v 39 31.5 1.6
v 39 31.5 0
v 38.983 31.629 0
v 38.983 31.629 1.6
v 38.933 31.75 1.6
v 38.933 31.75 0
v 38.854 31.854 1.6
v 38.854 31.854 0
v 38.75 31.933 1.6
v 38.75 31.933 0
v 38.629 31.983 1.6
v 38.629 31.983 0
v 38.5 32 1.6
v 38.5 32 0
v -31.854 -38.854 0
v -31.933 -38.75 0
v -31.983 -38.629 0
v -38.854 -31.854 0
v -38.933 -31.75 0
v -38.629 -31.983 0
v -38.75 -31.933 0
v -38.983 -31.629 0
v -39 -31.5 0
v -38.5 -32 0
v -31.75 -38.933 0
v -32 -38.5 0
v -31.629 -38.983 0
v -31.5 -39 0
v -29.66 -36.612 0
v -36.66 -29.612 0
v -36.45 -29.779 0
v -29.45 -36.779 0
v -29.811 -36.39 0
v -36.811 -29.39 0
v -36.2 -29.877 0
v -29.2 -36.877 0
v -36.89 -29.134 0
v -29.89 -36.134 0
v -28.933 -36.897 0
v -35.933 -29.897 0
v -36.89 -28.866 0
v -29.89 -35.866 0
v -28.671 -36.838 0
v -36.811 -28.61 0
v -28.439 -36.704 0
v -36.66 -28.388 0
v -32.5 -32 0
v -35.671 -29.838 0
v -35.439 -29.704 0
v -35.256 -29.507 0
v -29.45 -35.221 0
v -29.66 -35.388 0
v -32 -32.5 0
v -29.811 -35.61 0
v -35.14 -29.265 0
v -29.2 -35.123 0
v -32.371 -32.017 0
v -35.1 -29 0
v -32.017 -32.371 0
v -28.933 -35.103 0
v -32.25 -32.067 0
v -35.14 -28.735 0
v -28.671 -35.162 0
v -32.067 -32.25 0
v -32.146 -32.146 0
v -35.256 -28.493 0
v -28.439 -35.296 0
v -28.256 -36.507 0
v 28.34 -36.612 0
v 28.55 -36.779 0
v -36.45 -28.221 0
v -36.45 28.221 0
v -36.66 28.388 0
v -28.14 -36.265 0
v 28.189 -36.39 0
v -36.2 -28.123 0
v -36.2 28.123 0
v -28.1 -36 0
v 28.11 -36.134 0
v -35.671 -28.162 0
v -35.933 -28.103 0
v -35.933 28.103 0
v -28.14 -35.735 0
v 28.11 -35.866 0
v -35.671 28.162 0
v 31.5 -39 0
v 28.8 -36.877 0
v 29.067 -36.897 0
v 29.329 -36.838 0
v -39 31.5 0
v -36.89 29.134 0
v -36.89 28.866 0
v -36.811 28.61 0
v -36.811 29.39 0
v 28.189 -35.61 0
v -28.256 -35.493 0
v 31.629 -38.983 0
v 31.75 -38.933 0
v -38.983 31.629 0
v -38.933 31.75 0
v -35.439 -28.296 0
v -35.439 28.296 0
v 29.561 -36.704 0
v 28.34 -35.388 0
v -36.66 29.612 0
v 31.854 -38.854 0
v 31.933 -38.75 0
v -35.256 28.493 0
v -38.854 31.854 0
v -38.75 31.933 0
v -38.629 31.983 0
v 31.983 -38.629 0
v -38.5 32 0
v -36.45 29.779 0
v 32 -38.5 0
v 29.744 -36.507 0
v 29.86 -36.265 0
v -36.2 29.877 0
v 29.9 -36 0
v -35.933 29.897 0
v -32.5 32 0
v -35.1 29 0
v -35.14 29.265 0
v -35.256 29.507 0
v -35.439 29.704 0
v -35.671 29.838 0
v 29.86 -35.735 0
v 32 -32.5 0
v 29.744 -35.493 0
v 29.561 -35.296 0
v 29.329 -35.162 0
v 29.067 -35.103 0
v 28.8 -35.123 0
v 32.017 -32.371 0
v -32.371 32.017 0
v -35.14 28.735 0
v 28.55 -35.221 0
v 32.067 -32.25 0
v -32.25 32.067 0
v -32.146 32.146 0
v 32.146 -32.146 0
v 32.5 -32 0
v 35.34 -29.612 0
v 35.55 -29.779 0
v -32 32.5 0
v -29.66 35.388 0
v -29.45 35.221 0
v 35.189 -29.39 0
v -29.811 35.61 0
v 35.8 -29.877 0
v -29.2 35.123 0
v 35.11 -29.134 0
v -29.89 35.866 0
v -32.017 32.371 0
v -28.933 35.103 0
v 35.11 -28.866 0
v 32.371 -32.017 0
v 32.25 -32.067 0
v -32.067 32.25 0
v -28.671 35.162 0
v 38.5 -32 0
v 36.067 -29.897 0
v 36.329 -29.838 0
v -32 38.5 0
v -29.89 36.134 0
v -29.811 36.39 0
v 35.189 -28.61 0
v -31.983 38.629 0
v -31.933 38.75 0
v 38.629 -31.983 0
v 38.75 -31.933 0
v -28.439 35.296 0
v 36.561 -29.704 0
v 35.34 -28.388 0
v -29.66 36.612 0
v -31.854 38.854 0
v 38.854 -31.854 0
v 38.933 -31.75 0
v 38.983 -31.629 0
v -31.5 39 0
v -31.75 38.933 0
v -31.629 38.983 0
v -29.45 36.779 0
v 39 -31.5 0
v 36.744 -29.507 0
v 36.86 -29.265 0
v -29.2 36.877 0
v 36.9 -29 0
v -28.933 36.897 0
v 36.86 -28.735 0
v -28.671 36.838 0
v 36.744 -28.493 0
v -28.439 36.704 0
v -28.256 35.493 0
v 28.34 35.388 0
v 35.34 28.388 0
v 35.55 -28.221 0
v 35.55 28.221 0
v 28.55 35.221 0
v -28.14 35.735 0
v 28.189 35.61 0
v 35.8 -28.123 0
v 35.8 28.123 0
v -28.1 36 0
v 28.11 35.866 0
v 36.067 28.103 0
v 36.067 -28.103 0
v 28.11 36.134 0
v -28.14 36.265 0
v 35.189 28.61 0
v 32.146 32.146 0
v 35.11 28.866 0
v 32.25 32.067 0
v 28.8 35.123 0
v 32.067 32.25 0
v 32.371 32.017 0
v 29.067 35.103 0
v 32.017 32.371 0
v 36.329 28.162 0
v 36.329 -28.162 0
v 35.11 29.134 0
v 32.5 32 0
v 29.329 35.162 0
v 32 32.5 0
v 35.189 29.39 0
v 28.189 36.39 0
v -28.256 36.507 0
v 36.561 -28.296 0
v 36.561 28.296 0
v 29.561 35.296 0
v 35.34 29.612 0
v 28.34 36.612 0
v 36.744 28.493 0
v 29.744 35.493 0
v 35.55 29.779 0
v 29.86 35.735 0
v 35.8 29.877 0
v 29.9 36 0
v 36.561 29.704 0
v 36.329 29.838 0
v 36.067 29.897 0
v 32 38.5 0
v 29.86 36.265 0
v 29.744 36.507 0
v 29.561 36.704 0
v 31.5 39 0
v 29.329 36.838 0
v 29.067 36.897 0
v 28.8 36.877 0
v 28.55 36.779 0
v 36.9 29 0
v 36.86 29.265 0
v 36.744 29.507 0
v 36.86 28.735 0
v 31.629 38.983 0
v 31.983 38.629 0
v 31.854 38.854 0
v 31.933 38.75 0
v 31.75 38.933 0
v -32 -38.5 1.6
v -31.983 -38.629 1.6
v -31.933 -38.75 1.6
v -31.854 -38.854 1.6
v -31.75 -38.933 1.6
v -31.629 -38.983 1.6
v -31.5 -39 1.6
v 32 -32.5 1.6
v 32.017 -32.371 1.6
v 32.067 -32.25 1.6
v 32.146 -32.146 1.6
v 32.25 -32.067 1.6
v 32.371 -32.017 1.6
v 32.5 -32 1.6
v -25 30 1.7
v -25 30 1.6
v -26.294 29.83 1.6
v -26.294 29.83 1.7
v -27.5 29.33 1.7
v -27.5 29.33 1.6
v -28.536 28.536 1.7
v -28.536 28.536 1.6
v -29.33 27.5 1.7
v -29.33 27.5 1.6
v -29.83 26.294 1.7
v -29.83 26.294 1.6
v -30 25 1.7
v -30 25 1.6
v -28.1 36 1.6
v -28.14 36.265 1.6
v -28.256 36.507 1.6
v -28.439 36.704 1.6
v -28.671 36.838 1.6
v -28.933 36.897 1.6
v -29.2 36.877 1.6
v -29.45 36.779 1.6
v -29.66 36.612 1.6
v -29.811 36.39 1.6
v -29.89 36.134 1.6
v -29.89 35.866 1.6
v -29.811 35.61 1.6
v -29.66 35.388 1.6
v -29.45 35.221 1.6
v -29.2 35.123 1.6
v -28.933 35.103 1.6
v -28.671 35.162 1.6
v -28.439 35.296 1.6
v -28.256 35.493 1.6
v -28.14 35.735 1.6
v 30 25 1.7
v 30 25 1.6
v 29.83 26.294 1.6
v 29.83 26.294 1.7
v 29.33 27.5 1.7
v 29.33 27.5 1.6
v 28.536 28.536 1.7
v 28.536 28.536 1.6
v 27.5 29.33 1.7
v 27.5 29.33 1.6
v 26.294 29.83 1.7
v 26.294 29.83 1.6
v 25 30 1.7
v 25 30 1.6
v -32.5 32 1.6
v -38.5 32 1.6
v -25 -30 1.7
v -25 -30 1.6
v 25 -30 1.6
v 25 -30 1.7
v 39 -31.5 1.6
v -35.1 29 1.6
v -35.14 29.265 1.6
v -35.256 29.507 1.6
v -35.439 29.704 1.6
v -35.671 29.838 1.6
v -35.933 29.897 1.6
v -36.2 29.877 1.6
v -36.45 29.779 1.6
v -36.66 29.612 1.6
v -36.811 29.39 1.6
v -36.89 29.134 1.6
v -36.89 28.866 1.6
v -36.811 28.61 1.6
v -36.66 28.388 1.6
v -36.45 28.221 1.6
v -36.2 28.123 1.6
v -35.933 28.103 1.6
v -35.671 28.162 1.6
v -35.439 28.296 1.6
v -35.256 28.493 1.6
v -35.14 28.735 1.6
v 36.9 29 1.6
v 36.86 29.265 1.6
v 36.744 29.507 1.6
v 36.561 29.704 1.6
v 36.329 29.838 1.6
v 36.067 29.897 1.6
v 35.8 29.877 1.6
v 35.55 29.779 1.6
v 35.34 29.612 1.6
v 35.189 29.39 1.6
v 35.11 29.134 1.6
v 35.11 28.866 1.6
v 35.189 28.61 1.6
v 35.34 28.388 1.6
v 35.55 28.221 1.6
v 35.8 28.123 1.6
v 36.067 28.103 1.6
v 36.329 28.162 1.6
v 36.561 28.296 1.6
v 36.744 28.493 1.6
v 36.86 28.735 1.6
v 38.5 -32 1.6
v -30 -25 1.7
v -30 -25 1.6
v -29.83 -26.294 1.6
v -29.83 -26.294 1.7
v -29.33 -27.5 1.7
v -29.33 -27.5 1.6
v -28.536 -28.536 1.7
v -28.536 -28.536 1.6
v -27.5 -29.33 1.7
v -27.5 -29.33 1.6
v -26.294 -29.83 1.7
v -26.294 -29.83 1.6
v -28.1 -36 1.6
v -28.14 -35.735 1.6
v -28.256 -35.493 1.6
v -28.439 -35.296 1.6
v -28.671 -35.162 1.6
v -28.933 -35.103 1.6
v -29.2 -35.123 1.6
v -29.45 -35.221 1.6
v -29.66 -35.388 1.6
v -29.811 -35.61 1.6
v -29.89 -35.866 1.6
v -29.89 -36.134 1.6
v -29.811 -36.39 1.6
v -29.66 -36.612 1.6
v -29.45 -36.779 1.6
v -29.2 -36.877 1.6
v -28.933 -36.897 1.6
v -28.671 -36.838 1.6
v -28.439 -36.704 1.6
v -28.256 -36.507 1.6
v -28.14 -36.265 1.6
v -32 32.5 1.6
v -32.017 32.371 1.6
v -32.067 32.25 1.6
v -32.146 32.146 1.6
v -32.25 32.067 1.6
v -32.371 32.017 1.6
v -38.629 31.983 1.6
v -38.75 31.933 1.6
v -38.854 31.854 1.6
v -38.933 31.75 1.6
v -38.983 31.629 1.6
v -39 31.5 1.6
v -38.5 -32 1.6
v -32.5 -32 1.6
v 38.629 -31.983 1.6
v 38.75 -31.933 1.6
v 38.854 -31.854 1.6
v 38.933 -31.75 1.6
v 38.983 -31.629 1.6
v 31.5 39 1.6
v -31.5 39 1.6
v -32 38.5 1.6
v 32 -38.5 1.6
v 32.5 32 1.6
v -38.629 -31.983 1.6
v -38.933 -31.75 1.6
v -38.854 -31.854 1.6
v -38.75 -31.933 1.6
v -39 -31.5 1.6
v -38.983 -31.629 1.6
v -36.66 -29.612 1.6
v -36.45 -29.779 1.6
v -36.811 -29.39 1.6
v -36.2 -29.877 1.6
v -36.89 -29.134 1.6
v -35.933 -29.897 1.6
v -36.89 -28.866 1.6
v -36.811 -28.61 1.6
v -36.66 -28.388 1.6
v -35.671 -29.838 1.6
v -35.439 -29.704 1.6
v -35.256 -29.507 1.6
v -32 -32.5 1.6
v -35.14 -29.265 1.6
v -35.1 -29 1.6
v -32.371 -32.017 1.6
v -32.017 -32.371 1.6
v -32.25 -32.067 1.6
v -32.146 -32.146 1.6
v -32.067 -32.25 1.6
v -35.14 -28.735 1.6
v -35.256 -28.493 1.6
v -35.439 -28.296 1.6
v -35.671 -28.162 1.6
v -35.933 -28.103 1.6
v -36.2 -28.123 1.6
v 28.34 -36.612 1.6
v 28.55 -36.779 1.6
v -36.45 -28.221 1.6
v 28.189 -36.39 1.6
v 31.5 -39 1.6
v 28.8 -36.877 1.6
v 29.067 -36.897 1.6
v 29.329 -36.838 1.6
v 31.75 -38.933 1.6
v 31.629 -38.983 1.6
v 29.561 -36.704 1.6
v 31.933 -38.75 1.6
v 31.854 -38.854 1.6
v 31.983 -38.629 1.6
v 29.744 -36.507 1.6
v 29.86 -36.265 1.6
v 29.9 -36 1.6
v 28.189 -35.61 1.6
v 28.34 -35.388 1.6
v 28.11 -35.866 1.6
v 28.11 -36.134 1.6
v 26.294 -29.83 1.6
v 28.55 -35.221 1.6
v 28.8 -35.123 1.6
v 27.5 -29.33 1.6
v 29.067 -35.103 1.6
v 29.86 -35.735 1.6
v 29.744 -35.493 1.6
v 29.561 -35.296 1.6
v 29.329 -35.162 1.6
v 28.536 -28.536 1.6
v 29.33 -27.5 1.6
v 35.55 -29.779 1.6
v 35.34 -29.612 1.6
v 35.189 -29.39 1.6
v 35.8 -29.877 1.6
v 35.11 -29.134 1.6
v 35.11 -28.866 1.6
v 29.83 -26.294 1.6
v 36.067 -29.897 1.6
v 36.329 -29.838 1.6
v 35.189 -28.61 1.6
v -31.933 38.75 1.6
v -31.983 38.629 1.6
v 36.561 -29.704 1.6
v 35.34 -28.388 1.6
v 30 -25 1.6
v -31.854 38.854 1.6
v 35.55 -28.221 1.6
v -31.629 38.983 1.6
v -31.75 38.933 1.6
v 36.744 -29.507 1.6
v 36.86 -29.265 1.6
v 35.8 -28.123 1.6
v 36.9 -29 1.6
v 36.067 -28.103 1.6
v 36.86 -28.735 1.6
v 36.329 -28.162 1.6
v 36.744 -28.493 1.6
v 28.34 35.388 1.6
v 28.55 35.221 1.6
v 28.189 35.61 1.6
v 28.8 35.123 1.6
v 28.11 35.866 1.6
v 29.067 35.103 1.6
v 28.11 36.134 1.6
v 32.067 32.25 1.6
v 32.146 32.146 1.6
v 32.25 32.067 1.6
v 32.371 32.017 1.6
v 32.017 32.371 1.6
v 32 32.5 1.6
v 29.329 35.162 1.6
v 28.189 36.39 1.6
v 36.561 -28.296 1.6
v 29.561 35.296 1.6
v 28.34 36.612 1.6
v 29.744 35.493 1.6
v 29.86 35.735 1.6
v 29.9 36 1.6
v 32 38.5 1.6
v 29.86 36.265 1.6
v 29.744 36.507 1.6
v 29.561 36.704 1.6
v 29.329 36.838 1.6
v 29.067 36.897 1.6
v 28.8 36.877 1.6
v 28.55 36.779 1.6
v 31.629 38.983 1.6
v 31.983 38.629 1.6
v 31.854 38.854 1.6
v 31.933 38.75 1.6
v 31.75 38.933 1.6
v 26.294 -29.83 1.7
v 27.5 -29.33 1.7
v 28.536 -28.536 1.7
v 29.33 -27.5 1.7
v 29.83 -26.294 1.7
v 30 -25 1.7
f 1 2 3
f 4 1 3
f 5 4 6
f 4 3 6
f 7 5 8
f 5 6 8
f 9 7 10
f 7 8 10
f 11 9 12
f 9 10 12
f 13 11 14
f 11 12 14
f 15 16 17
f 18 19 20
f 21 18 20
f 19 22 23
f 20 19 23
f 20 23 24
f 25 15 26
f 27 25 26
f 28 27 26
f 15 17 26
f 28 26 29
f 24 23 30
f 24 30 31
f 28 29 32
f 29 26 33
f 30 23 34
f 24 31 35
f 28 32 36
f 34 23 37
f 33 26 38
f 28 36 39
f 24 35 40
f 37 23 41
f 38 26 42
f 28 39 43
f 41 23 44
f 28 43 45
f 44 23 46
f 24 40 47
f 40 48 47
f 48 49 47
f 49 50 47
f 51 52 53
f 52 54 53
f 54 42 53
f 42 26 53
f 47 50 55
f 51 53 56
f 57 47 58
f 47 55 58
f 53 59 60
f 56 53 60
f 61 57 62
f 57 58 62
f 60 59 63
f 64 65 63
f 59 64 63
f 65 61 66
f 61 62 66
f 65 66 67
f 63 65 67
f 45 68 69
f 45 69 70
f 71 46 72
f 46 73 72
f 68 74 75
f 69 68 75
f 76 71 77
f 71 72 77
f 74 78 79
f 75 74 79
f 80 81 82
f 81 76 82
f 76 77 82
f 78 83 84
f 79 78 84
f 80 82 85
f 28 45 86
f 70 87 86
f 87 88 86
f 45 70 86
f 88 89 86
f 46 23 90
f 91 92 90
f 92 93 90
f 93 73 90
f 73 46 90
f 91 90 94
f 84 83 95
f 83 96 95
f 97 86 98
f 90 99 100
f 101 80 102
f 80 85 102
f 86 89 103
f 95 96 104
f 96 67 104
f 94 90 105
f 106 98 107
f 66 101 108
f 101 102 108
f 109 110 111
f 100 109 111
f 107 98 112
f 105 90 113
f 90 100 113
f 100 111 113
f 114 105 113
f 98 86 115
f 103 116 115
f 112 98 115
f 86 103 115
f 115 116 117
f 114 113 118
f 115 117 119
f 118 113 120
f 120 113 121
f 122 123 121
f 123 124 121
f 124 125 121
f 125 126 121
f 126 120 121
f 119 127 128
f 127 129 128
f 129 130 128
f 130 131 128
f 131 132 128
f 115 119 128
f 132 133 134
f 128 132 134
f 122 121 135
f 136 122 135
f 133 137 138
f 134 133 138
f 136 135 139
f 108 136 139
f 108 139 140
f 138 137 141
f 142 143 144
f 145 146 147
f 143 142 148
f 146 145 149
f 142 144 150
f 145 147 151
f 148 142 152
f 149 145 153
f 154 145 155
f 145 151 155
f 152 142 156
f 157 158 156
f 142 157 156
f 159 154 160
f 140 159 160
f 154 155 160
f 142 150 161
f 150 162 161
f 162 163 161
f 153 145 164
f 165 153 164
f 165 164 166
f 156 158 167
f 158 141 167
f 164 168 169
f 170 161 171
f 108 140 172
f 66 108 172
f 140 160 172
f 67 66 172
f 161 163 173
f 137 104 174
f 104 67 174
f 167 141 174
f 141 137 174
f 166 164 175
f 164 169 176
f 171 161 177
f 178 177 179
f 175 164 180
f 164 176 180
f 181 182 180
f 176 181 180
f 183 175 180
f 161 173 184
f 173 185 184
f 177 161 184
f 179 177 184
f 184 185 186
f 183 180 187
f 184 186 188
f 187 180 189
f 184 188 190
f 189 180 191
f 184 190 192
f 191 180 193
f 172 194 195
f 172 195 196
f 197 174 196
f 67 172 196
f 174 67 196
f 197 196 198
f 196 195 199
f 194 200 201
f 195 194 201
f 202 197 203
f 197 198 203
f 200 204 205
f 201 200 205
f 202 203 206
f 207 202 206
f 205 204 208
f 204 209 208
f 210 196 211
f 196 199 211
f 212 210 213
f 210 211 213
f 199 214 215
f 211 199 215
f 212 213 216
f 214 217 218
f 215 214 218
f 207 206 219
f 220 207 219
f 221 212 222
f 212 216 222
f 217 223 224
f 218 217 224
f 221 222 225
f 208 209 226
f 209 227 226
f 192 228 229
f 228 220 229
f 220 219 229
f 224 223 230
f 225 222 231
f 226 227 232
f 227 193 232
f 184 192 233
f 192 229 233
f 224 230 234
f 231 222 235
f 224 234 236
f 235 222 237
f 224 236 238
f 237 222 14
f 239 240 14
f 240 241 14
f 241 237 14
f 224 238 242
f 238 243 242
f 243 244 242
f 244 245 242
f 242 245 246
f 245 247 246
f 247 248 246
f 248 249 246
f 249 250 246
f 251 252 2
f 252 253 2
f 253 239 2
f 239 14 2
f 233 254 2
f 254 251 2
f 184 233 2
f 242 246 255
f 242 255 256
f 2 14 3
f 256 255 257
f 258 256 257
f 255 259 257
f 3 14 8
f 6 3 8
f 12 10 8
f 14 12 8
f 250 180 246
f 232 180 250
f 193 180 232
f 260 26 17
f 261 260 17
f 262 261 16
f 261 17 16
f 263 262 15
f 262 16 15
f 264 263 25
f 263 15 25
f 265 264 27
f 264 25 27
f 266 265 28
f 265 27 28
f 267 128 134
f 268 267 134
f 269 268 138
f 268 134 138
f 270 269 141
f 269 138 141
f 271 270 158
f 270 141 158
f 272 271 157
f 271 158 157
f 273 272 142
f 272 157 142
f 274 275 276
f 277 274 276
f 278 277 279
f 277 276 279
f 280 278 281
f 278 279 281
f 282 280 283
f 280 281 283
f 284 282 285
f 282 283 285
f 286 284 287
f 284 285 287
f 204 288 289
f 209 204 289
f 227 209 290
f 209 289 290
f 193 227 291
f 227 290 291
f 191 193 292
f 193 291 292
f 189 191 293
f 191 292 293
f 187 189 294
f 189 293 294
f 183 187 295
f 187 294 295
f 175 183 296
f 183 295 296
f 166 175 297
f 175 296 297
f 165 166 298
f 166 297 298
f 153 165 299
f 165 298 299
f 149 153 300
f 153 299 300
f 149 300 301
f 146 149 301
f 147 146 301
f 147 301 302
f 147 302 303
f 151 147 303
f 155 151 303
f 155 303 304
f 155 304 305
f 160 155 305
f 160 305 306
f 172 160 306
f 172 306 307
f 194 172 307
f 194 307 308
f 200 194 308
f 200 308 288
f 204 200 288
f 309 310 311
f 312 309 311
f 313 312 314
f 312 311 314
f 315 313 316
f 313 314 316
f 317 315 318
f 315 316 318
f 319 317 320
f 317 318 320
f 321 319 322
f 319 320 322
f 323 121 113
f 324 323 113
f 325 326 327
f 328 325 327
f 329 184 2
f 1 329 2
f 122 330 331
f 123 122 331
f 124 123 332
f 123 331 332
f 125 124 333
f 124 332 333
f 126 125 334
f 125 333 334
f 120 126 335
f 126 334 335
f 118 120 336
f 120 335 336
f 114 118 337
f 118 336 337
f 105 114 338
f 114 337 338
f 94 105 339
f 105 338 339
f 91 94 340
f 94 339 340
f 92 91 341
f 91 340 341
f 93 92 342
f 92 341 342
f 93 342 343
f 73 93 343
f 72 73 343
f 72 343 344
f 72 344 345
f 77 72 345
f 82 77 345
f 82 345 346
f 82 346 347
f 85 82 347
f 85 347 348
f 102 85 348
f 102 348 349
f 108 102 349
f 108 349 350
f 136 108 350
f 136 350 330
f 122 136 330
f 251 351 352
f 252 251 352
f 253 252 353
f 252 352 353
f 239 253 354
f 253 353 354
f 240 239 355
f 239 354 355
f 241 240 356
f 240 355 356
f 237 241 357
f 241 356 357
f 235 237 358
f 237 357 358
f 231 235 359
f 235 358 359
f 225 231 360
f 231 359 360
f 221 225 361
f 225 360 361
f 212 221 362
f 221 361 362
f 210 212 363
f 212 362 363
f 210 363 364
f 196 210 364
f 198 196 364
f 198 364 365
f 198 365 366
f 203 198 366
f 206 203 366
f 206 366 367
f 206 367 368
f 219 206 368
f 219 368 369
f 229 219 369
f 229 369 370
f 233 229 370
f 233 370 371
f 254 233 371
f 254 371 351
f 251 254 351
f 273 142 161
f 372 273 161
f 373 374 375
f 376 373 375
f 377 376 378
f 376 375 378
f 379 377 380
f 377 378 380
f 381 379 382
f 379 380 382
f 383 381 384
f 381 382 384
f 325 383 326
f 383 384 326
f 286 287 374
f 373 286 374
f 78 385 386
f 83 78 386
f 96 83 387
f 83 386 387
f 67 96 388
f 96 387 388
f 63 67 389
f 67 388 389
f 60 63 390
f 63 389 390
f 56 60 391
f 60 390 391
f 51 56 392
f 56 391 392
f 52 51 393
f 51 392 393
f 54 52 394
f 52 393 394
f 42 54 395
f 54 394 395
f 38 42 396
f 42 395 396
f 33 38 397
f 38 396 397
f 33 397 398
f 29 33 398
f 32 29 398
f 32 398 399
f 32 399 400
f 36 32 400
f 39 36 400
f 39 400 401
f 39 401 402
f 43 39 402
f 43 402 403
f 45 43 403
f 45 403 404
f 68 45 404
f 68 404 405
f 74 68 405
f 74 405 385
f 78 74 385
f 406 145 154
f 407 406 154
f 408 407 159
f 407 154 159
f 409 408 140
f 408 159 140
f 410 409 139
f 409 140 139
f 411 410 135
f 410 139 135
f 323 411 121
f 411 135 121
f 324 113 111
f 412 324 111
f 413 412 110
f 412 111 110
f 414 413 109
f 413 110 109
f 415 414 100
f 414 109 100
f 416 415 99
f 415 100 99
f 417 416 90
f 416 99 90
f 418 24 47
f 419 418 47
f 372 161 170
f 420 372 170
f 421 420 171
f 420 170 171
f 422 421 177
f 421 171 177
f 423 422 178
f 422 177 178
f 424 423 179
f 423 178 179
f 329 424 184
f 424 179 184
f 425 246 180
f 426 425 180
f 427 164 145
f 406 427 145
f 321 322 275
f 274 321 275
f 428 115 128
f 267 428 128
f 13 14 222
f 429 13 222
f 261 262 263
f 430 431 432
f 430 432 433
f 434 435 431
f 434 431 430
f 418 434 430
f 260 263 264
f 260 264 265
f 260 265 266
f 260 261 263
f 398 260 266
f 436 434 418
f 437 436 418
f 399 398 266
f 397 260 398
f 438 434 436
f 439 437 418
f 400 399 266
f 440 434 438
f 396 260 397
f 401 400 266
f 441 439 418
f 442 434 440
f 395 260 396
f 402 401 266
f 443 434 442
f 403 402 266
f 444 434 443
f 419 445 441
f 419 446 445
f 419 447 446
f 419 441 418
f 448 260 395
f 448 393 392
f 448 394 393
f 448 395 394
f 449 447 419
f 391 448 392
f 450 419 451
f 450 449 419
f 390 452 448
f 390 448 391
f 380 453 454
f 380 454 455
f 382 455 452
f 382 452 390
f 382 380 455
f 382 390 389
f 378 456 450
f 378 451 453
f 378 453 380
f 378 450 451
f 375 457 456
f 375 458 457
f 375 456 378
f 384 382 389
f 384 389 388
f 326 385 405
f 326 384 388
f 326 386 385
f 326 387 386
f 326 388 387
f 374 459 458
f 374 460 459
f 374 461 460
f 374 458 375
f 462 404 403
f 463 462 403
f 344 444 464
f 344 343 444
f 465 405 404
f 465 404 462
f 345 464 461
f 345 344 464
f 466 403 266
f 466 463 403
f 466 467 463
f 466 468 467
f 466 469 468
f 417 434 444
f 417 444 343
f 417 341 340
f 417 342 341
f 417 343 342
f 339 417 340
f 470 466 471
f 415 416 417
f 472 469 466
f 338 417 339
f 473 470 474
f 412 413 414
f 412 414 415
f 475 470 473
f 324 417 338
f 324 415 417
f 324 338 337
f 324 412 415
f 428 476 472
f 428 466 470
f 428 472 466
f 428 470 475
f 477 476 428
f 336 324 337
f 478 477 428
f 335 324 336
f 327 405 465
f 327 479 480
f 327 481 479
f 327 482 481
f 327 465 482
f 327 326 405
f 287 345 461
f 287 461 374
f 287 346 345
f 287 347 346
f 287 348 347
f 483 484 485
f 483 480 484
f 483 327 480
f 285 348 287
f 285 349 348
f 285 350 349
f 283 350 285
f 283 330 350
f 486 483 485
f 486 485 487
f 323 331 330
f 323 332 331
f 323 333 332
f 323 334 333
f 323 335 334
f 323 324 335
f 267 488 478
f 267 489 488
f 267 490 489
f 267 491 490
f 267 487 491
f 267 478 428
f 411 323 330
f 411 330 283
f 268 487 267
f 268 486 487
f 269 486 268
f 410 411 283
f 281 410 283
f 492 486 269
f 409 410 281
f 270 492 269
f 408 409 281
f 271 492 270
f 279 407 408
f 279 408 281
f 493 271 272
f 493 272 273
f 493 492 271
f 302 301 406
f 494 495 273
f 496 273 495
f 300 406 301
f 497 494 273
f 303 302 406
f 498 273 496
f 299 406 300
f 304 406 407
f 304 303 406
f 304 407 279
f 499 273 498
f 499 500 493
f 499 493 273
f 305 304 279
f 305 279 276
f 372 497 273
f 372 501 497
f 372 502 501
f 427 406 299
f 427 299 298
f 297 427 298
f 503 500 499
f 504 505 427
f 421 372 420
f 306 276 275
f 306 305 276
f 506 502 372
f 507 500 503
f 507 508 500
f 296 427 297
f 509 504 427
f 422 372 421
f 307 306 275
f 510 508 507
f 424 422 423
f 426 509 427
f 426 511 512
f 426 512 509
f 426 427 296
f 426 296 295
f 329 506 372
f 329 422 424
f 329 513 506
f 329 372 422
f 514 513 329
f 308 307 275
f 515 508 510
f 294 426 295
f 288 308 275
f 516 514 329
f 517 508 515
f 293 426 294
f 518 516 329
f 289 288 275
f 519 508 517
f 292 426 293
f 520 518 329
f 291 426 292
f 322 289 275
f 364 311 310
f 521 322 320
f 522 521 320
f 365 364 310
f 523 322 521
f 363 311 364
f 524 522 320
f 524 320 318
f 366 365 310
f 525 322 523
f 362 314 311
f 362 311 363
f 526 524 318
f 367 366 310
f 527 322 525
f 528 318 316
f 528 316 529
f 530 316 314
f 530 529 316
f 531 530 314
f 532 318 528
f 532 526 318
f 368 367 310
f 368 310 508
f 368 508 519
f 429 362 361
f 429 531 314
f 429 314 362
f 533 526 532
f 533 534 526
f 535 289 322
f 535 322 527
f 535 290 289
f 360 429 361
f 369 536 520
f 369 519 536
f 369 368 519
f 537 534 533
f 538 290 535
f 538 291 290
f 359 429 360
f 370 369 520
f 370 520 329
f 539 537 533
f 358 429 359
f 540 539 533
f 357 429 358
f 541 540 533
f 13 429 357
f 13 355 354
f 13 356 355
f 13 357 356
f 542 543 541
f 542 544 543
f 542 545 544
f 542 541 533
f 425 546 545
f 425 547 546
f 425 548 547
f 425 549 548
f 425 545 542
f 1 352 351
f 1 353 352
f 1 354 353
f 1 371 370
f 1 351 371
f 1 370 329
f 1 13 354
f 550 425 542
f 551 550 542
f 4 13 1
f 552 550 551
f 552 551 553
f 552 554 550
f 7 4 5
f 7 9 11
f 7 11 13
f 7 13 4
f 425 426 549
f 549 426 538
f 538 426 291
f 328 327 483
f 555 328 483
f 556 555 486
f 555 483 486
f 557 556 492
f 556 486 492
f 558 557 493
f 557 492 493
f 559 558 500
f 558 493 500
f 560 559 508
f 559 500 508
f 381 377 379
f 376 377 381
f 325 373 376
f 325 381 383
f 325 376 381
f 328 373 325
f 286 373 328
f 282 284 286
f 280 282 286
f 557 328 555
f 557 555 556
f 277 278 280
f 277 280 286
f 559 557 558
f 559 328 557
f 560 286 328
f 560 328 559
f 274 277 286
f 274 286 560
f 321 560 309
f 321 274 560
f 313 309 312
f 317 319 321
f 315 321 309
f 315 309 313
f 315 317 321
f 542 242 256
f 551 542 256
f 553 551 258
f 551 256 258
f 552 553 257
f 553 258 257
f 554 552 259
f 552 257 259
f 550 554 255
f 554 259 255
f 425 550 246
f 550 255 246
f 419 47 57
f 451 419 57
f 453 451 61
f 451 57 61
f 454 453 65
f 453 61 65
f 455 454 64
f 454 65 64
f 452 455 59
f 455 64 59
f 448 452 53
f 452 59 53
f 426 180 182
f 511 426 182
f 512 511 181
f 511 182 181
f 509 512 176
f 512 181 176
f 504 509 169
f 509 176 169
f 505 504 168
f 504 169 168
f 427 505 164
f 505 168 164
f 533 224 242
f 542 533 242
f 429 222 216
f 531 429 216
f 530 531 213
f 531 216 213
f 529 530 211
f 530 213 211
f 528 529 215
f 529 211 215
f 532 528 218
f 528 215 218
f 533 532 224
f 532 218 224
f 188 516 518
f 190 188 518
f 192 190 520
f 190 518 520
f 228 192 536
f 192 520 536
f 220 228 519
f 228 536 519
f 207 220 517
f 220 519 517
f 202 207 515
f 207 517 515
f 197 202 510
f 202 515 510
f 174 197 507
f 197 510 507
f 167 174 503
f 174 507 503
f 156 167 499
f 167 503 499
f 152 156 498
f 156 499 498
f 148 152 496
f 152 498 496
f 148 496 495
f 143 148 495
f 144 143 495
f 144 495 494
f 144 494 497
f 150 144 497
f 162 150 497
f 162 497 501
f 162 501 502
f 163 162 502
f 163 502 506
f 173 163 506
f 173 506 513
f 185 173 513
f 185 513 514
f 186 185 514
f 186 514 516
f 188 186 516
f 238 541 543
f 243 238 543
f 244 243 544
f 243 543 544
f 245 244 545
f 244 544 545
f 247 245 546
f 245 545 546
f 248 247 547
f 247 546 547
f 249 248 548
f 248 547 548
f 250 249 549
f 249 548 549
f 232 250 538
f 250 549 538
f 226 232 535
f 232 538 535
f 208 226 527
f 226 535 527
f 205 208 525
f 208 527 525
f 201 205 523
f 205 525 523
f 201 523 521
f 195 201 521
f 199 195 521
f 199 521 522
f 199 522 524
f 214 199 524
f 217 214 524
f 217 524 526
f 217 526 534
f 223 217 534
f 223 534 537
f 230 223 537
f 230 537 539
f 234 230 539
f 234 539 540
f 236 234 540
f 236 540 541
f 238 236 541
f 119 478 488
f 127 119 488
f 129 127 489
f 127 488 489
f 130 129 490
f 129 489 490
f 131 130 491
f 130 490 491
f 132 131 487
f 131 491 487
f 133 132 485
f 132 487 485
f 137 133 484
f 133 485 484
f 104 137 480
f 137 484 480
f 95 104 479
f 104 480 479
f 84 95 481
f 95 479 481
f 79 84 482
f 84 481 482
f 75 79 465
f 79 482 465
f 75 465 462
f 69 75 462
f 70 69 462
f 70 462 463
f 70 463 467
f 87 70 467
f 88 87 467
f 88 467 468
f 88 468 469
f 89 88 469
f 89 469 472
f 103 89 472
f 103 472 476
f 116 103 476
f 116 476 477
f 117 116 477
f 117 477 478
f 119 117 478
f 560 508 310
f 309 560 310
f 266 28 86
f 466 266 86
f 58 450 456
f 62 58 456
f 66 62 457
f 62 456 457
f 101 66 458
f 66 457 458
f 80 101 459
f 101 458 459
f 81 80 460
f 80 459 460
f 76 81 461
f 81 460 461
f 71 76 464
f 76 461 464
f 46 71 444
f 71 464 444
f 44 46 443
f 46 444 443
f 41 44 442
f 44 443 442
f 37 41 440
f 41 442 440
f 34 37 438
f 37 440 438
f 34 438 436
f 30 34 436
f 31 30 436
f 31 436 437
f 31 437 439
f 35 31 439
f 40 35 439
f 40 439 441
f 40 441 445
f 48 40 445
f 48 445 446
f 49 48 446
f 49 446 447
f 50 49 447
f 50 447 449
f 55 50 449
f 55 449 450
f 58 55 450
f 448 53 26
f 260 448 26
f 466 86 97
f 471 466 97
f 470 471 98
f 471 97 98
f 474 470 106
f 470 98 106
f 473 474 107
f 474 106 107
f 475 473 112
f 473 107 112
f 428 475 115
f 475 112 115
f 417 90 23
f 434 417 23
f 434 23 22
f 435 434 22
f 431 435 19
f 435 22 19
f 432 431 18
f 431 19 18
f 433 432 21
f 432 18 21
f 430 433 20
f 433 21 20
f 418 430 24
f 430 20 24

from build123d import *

# Parameters (mm, degrees)
BOSS_EXTRUDE1_DEPTH              = 1.6
BOSS_EXTRUDE2_DEPTH              = 0.1
M1_6_HOLE1_FIXINGSTRUCTURE_D     = 1.8
M1_6_HOLE1_FIXINGSTRUCTURE_DEPTH = 200
M1_6_HOLE1_FIXINGSTRUCTURE_TIP   = 0.540774557


with BuildPart() as part:
    # Sketch1 → Boss-Extrude1 (new body)
    with BuildSketch(Plane.XY):
        with BuildLine():
            Line((-32, 38.5), (-32, 32.5))
            ThreePointArc((-32, 32.5), (-32.146446609, 32.146446609), (-32.5, 32))
            Line((-32.5, 32), (-38.5, 32))
            ThreePointArc((-38.5, 32), (-38.853553391, 31.853553391), (-39, 31.5))
            Line((-39, 31.5), (-39, -31.5))
            ThreePointArc((-39, -31.5), (-38.853553391, -31.853553391), (-38.5, -32))
            Line((-38.5, -32), (-32.5, -32))
            ThreePointArc((-32.5, -32), (-32.146446609, -32.146446609), (-32, -32.5))
            Line((-32, -32.5), (-32, -38.5))
            ThreePointArc((-32, -38.5), (-31.853553391, -38.853553391), (-31.5, -39))
            Line((-31.5, -39), (31.5, -39))
            ThreePointArc((31.5, -39), (31.853553391, -38.853553391), (32, -38.5))
            Line((32, -38.5), (32, -32.5))
            ThreePointArc((32, -32.5), (32.146446609, -32.146446609), (32.5, -32))
            Line((32.5, -32), (38.5, -32))
            ThreePointArc((38.5, -32), (38.853553391, -31.853553391), (39, -31.5))
            Line((39, -31.5), (39, 31.5))
            ThreePointArc((39, 31.5), (38.853553391, 31.853553391), (38.5, 32))
            Line((38.5, 32), (32.5, 32))
            ThreePointArc((32.5, 32), (32.146446609, 32.146446609), (32, 32.5))
            Line((32, 32.5), (32, 38.5))
            ThreePointArc((32, 38.5), (31.853553391, 38.853553391), (31.5, 39))
            Line((31.5, 39), (-31.5, 39))
            ThreePointArc((-31.5, 39), (-31.853553391, 38.853553391), (-32, 38.5))
        make_face()
    extrude(amount=BOSS_EXTRUDE1_DEPTH)

    # Esboço1 → Boss-Extrude2 (add)
    with BuildSketch(Plane.XY.offset(1.6)):
        with BuildLine():
            Line((-25, -30), (25, -30))
            ThreePointArc((25, -30), (28.535533906, -28.535533906), (30, -25))
            Line((30, -25), (30, 25))
            ThreePointArc((30, 25), (28.535533906, 28.535533906), (25, 30))
            Line((25, 30), (-25, 30))
            ThreePointArc((-25, 30), (-28.535533906, 28.535533906), (-30, 25))
            Line((-30, 25), (-30, -25))
            ThreePointArc((-30, -25), (-28.535533906, -28.535533906), (-25, -30))
        make_face()
    extrude(amount=BOSS_EXTRUDE2_DEPTH)

    # M1.6 Hole1-FixingStructure
    with Locations(Plane(origin=(0, 0, 0), x_dir=(-1, 0, 0), z_dir=(0, 0, -1))):
        with Locations((-29, 36), (29, 36), (-29, -36), (29, -36), (36, 29), (36, -29), (-36, -29), (-36, 29)):
            Hole(M1_6_HOLE1_FIXINGSTRUCTURE_D / 2, depth=M1_6_HOLE1_FIXINGSTRUCTURE_DEPTH)
            with Locations((0, 0, -(M1_6_HOLE1_FIXINGSTRUCTURE_DEPTH + M1_6_HOLE1_FIXINGSTRUCTURE_TIP / 2))):  # 118° drill point
                Cone(0, M1_6_HOLE1_FIXINGSTRUCTURE_D / 2, M1_6_HOLE1_FIXINGSTRUCTURE_TIP, mode=Mode.SUBTRACT)


solid = part.part
